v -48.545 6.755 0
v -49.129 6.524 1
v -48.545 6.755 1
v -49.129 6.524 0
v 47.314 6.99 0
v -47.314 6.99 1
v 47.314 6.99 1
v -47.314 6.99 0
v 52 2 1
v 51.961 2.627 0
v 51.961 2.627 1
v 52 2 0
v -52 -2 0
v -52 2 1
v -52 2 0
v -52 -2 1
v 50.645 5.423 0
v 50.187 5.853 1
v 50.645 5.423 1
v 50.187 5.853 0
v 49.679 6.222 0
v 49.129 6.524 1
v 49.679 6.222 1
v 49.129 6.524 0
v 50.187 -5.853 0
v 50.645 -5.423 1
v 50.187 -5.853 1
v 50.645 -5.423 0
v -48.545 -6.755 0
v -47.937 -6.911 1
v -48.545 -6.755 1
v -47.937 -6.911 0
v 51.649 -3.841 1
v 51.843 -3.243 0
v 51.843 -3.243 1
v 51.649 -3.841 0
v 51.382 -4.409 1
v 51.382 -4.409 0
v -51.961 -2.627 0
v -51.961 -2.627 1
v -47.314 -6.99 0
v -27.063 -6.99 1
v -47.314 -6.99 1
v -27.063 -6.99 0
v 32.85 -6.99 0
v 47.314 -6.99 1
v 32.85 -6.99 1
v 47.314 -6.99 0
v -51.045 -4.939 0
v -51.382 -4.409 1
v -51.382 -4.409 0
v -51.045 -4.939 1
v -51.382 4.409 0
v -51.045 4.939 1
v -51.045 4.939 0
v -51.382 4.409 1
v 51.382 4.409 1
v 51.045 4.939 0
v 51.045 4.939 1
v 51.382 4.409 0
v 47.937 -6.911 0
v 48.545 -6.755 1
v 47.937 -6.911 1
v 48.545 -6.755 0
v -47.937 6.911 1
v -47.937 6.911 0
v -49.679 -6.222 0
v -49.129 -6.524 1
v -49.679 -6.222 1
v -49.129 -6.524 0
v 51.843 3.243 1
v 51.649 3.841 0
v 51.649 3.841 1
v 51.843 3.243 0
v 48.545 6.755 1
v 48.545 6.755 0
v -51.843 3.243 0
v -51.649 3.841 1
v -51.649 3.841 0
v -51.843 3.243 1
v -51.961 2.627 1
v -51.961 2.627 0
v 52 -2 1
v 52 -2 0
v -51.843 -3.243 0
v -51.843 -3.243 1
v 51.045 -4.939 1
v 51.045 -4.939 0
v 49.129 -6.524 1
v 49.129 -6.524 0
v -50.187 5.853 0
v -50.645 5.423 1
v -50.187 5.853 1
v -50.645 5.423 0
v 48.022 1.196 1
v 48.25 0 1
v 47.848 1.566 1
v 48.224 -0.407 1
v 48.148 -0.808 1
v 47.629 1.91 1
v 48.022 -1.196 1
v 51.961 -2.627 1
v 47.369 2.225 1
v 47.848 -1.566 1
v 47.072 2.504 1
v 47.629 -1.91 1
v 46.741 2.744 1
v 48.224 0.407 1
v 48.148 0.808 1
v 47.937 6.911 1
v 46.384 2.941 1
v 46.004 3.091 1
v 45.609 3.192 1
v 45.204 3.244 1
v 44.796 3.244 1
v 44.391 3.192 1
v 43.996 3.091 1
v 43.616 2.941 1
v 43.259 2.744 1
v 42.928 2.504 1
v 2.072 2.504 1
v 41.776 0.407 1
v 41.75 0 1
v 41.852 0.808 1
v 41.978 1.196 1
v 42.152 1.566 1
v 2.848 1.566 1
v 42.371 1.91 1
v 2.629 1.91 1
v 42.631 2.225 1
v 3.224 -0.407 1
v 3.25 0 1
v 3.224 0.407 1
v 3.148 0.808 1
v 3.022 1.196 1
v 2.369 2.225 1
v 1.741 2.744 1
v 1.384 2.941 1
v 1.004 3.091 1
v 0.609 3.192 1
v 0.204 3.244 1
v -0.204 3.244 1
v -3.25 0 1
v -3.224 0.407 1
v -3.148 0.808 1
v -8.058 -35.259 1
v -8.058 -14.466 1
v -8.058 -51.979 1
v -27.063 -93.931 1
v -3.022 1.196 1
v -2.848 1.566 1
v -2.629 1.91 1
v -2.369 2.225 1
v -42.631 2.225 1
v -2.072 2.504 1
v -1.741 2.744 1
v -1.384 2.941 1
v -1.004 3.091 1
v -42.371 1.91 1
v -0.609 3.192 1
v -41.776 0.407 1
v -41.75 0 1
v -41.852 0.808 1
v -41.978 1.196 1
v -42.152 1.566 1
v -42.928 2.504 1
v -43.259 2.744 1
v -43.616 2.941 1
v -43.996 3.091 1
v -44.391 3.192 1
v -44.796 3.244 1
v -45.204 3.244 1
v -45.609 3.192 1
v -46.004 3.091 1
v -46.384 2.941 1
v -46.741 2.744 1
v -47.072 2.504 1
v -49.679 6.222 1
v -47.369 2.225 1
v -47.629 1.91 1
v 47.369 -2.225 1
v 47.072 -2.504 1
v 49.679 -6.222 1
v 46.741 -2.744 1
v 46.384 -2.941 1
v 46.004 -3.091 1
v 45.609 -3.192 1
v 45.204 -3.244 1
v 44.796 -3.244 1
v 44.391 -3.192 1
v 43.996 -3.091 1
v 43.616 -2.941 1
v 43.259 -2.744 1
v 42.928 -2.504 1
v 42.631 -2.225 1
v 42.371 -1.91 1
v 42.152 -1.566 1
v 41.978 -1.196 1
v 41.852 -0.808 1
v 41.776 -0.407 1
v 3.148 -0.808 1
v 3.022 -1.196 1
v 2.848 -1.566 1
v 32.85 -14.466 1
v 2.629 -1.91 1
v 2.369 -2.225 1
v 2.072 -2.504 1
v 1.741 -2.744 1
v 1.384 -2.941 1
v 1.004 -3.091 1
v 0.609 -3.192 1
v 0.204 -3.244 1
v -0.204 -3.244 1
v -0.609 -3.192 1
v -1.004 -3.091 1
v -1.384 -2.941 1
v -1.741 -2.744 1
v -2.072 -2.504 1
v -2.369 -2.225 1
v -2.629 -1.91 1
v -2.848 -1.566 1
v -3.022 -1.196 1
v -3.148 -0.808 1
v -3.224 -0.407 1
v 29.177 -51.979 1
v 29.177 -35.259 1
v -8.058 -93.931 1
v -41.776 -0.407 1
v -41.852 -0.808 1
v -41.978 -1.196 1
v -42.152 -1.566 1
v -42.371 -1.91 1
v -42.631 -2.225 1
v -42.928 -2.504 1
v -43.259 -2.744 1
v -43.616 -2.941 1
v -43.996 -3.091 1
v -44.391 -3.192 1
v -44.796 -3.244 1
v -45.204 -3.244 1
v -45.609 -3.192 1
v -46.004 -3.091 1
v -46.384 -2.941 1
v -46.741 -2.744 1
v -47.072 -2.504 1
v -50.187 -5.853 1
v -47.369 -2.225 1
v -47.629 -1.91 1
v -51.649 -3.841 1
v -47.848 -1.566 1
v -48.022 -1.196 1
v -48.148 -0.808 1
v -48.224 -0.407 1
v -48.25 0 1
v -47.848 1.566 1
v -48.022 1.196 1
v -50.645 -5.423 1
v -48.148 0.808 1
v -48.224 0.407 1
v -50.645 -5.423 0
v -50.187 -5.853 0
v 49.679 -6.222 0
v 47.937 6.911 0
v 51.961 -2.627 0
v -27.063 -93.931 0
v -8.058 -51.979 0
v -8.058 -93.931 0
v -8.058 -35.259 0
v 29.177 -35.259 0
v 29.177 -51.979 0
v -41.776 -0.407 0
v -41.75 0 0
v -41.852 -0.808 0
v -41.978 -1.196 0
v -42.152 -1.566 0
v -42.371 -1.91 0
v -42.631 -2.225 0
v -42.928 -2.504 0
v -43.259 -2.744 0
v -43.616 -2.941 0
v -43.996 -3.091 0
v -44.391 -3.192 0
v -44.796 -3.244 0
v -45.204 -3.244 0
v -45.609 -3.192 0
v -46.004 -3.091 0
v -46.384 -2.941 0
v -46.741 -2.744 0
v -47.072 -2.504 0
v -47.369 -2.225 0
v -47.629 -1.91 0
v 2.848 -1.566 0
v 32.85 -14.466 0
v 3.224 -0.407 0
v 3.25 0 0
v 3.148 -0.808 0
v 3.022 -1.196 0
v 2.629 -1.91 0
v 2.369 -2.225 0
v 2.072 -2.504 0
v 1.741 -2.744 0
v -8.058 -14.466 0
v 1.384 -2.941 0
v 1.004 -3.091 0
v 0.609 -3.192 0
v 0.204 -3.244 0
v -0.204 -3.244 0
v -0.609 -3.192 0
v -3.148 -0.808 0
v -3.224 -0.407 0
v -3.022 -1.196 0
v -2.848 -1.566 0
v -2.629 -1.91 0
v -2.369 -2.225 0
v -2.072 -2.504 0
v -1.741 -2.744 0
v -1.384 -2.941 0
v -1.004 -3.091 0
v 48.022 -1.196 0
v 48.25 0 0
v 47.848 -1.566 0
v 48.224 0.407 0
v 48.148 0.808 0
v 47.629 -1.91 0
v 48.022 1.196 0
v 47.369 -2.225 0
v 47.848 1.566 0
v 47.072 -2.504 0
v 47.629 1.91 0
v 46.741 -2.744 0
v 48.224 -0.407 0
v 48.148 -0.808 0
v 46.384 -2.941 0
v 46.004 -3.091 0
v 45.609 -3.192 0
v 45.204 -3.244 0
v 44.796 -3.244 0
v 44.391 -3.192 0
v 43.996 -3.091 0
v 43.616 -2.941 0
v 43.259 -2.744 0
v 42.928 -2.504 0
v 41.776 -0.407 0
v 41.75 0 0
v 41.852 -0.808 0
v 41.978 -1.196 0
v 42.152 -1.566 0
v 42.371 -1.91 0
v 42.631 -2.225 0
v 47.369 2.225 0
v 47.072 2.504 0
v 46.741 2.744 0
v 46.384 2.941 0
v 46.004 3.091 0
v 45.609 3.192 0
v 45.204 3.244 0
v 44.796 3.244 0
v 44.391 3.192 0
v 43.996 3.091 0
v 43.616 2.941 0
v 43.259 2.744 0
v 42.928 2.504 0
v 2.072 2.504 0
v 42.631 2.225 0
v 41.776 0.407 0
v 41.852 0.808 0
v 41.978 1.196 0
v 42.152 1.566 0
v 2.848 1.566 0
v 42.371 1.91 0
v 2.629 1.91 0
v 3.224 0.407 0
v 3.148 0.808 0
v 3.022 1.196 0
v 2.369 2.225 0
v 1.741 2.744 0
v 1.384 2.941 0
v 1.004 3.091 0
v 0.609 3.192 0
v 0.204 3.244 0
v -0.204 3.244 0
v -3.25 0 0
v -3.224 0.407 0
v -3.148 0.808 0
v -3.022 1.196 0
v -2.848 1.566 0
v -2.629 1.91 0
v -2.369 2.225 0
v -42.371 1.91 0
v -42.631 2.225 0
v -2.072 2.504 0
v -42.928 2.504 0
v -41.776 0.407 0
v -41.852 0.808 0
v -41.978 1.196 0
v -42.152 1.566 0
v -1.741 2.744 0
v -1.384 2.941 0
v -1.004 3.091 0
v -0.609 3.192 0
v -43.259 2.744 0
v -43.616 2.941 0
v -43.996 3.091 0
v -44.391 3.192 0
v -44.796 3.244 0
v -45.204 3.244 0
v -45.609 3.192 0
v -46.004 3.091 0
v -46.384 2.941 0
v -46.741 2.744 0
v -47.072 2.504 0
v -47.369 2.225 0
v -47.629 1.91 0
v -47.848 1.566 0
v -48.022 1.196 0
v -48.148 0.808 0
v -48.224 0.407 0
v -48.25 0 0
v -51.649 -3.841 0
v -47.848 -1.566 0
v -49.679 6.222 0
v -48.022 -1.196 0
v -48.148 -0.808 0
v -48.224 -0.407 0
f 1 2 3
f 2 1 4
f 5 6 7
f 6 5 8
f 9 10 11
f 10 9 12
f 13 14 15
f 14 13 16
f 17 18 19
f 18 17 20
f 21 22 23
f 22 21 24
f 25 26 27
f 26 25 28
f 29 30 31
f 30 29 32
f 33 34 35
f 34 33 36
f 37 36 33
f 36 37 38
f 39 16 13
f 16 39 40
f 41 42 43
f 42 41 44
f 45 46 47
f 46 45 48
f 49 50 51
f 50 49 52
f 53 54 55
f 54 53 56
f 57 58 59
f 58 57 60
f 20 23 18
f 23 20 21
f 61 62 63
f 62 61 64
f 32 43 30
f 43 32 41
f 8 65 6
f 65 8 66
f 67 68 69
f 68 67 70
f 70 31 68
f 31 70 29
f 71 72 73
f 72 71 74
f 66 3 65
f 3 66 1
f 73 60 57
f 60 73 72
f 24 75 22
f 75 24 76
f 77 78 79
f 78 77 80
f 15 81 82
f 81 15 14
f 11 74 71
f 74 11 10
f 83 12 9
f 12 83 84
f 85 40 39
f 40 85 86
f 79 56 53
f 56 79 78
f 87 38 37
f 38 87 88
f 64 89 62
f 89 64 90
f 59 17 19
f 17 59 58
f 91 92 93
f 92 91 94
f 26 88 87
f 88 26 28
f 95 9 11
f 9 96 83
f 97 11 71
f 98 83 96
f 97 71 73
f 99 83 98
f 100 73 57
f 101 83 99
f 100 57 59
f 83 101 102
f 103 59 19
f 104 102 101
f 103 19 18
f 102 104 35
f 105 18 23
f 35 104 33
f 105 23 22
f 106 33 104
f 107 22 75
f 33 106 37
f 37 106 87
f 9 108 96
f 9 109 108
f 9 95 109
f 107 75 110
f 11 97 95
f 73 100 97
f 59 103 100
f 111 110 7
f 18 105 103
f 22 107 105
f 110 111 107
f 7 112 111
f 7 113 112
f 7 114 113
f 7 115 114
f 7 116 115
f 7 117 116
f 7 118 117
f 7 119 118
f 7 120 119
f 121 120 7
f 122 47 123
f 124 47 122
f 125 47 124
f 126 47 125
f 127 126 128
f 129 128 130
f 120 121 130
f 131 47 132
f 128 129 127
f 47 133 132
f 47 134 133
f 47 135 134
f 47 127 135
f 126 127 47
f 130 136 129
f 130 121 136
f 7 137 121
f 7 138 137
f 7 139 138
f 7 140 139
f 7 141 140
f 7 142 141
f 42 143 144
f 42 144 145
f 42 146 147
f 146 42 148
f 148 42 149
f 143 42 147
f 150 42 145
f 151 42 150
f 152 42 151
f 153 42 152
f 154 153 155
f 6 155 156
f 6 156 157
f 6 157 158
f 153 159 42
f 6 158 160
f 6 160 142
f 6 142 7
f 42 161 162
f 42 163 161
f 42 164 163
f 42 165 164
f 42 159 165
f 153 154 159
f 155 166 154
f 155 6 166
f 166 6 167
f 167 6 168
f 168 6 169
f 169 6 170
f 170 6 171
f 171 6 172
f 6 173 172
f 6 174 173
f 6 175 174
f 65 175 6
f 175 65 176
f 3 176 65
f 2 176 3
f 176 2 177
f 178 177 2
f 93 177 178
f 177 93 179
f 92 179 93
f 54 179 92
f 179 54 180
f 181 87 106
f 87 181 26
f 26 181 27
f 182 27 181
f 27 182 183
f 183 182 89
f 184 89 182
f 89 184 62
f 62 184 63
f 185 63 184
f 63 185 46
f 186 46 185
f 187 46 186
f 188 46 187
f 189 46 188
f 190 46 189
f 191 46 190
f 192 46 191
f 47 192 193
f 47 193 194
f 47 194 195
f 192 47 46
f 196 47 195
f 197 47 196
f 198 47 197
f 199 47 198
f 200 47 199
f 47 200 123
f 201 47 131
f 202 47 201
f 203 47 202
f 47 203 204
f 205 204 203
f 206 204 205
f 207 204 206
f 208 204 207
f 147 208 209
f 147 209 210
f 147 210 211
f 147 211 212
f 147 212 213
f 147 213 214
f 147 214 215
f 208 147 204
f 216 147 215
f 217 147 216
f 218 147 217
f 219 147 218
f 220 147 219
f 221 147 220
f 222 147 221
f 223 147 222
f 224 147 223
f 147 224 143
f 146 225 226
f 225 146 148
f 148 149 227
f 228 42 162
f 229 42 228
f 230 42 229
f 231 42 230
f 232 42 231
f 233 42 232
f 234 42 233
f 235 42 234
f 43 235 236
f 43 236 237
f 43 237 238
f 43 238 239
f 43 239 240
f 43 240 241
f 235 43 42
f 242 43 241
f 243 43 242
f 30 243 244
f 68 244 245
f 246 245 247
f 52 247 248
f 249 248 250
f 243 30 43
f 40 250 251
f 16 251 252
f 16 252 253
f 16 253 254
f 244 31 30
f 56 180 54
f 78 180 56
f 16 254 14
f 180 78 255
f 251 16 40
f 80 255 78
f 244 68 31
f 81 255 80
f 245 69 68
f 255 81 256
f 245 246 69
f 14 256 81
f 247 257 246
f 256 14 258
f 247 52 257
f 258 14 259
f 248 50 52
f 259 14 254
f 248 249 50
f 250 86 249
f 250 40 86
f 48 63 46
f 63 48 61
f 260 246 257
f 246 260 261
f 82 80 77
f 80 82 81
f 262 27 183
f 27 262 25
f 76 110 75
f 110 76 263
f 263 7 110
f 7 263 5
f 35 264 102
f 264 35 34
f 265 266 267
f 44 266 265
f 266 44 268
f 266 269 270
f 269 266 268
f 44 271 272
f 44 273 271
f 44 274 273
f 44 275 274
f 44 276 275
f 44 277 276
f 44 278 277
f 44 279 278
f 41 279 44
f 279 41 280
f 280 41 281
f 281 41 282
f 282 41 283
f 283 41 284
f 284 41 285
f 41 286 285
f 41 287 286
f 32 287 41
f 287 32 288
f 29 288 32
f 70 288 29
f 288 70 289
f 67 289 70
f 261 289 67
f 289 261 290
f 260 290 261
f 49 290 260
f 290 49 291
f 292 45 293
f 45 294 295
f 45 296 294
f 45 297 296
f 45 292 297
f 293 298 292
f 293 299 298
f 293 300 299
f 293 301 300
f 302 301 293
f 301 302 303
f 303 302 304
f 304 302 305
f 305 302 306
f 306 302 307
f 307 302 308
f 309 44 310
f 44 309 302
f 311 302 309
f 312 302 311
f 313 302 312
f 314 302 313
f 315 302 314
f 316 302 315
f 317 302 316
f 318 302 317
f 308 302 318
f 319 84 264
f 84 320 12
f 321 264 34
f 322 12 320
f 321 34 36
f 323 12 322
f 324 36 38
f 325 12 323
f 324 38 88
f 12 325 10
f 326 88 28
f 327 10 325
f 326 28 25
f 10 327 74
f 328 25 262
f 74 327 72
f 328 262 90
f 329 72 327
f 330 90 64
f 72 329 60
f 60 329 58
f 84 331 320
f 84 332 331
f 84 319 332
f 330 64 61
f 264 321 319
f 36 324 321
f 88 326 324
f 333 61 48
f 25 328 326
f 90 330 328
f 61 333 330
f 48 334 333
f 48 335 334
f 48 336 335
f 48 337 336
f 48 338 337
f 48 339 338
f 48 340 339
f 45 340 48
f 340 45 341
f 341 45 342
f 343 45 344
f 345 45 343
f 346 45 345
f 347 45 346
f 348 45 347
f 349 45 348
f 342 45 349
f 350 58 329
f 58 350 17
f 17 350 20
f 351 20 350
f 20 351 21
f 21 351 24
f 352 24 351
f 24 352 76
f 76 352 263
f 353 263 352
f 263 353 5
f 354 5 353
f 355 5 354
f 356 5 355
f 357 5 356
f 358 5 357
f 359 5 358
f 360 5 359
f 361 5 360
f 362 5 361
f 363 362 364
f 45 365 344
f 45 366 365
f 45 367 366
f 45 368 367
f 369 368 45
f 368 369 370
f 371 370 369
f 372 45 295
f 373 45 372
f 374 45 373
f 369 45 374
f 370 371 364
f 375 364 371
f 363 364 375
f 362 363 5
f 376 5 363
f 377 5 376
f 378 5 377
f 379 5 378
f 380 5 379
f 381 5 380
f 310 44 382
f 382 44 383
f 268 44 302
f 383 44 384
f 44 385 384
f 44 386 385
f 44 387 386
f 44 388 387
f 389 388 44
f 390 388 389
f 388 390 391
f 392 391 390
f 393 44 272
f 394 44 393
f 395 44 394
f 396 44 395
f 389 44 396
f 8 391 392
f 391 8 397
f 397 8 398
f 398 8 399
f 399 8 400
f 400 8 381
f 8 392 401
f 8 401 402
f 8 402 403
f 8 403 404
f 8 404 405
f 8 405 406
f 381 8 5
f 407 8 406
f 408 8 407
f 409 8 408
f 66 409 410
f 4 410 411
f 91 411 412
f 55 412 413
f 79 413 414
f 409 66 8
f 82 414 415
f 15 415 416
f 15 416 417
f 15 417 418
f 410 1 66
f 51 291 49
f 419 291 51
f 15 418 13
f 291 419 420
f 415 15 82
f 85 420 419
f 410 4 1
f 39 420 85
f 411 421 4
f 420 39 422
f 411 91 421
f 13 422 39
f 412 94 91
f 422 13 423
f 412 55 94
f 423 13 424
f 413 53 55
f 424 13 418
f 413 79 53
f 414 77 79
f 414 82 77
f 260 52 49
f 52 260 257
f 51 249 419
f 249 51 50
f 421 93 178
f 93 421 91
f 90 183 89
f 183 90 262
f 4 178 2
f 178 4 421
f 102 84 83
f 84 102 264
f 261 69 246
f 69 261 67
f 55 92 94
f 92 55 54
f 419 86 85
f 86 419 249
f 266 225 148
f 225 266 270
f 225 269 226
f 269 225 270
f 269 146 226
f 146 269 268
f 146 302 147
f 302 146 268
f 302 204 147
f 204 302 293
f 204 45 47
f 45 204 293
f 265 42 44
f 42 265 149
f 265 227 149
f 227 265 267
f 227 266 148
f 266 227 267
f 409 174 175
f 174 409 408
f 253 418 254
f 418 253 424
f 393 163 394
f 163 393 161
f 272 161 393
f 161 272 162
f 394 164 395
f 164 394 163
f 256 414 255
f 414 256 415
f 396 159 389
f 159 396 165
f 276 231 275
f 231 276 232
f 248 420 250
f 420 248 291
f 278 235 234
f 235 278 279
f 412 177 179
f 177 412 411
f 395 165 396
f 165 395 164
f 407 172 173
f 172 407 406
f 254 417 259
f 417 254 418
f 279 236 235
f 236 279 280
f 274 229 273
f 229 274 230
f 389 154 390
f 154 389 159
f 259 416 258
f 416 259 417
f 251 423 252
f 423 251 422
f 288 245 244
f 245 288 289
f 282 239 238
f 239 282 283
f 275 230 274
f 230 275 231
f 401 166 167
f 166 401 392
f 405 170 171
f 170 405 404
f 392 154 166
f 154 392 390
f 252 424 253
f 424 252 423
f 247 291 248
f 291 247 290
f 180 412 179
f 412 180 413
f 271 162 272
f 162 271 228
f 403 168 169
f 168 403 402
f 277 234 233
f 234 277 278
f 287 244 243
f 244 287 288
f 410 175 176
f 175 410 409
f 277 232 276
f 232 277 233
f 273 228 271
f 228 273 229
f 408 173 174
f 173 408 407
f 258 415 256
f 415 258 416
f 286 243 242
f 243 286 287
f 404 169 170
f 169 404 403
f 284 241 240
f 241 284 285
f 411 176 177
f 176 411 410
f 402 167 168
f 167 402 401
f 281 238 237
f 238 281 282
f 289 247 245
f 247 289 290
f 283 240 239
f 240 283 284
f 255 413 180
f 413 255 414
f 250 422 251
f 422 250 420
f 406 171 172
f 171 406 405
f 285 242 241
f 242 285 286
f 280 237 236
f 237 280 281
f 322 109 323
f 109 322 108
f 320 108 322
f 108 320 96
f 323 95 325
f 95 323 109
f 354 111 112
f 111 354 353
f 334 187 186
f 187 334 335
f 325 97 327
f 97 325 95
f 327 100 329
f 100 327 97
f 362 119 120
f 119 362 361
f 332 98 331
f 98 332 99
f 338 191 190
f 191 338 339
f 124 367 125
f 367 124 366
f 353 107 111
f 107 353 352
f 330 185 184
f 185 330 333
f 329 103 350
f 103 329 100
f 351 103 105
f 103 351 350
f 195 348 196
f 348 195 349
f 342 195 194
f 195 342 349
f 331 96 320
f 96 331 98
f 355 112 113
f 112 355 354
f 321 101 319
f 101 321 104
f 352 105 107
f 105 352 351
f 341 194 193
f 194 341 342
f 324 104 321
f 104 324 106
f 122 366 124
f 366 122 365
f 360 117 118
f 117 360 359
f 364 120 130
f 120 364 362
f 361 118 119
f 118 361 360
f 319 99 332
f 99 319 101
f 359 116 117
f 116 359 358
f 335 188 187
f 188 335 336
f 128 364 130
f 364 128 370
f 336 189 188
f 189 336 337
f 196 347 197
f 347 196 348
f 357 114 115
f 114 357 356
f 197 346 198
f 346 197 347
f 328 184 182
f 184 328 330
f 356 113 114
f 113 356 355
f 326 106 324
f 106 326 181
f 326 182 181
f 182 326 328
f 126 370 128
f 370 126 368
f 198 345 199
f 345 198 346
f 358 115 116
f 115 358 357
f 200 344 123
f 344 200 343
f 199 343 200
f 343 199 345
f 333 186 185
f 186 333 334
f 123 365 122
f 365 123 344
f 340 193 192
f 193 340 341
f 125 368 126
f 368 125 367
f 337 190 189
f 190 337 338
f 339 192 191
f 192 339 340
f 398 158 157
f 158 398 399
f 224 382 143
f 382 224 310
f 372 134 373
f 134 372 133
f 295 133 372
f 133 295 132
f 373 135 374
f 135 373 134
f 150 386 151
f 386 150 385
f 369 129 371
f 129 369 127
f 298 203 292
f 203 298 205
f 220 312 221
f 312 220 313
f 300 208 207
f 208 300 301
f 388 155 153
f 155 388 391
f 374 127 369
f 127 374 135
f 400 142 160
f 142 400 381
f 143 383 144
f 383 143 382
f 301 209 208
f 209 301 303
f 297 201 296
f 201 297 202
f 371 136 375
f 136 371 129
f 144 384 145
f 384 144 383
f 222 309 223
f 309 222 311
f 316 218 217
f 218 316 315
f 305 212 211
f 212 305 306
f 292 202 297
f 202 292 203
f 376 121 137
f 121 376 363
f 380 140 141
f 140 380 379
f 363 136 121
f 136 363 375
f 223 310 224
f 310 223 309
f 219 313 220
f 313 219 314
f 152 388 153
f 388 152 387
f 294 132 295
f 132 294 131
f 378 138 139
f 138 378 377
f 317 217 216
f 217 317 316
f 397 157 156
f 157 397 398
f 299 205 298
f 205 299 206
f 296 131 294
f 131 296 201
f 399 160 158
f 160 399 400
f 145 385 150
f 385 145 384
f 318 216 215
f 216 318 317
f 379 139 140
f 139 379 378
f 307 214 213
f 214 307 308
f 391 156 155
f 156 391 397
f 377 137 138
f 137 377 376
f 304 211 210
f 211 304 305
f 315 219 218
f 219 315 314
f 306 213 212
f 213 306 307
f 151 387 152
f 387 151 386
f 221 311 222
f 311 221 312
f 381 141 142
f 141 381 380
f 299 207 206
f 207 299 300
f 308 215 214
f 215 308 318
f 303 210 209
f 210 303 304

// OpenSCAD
$fn = 50;


difference() {
	union() {
		translate(v = [0, 0, 0]) {
			rotate(a = [0, 0, 0]) {
				hull() {
					translate(v = [-47.0000000000, 2.0000000000, 0]) {
						rotate(a = [0, 0, 0]) {
							translate(v = [0, 0, 0]) {
								rotate(a = [0, 0, 0]) {
									cylinder(h = 1, r = 5);
								}
							}
						}
					}
					translate(v = [47.0000000000, 2.0000000000, 0]) {
						rotate(a = [0, 0, 0]) {
							translate(v = [0, 0, 0]) {
								rotate(a = [0, 0, 0]) {
									cylinder(h = 1, r = 5);
								}
							}
						}
					}
					translate(v = [-47.0000000000, -2.0000000000, 0]) {
						rotate(a = [0, 0, 0]) {
							translate(v = [0, 0, 0]) {
								rotate(a = [0, 0, 0]) {
									cylinder(h = 1, r = 5);
								}
							}
						}
					}
					translate(v = [47.0000000000, -2.0000000000, 0]) {
						rotate(a = [0, 0, 0]) {
							translate(v = [0, 0, 0]) {
								rotate(a = [0, 0, 0]) {
									cylinder(h = 1, r = 5);
								}
							}
						}
					}
				}
			}
		}
		translate(v = [0, 0, 0]) {
			rotate(a = [0, 0, 0]) {
				linear_extrude(height = 1) {
					text(font = "DejaVu Sans Mono:style=Bold", halign = "center", size = 95, text = "F", valign = "top");
				}
			}
		}
	}
	union() {
		translate(v = [-45.0000000000, 0.0000000000, -125.0000000000]) {
			rotate(a = [0, 0, 0]) {
				cylinder(h = 250, r = 3.2500000000);
			}
		}
		translate(v = [45.0000000000, 0.0000000000, -125.0000000000]) {
			rotate(a = [0, 0, 0]) {
				cylinder(h = 250, r = 3.2500000000);
			}
		}
		translate(v = [45.0000000000, 0.0000000000, -125.0000000000]) {
			rotate(a = [0, 0, 0]) {
				cylinder(h = 250, r = 3.2500000000);
			}
		}
		translate(v = [0, 0, -125.0000000000]) {
			rotate(a = [0, 0, 0]) {
				cylinder(h = 250, r = 3.2500000000);
			}
		}
	}
}
